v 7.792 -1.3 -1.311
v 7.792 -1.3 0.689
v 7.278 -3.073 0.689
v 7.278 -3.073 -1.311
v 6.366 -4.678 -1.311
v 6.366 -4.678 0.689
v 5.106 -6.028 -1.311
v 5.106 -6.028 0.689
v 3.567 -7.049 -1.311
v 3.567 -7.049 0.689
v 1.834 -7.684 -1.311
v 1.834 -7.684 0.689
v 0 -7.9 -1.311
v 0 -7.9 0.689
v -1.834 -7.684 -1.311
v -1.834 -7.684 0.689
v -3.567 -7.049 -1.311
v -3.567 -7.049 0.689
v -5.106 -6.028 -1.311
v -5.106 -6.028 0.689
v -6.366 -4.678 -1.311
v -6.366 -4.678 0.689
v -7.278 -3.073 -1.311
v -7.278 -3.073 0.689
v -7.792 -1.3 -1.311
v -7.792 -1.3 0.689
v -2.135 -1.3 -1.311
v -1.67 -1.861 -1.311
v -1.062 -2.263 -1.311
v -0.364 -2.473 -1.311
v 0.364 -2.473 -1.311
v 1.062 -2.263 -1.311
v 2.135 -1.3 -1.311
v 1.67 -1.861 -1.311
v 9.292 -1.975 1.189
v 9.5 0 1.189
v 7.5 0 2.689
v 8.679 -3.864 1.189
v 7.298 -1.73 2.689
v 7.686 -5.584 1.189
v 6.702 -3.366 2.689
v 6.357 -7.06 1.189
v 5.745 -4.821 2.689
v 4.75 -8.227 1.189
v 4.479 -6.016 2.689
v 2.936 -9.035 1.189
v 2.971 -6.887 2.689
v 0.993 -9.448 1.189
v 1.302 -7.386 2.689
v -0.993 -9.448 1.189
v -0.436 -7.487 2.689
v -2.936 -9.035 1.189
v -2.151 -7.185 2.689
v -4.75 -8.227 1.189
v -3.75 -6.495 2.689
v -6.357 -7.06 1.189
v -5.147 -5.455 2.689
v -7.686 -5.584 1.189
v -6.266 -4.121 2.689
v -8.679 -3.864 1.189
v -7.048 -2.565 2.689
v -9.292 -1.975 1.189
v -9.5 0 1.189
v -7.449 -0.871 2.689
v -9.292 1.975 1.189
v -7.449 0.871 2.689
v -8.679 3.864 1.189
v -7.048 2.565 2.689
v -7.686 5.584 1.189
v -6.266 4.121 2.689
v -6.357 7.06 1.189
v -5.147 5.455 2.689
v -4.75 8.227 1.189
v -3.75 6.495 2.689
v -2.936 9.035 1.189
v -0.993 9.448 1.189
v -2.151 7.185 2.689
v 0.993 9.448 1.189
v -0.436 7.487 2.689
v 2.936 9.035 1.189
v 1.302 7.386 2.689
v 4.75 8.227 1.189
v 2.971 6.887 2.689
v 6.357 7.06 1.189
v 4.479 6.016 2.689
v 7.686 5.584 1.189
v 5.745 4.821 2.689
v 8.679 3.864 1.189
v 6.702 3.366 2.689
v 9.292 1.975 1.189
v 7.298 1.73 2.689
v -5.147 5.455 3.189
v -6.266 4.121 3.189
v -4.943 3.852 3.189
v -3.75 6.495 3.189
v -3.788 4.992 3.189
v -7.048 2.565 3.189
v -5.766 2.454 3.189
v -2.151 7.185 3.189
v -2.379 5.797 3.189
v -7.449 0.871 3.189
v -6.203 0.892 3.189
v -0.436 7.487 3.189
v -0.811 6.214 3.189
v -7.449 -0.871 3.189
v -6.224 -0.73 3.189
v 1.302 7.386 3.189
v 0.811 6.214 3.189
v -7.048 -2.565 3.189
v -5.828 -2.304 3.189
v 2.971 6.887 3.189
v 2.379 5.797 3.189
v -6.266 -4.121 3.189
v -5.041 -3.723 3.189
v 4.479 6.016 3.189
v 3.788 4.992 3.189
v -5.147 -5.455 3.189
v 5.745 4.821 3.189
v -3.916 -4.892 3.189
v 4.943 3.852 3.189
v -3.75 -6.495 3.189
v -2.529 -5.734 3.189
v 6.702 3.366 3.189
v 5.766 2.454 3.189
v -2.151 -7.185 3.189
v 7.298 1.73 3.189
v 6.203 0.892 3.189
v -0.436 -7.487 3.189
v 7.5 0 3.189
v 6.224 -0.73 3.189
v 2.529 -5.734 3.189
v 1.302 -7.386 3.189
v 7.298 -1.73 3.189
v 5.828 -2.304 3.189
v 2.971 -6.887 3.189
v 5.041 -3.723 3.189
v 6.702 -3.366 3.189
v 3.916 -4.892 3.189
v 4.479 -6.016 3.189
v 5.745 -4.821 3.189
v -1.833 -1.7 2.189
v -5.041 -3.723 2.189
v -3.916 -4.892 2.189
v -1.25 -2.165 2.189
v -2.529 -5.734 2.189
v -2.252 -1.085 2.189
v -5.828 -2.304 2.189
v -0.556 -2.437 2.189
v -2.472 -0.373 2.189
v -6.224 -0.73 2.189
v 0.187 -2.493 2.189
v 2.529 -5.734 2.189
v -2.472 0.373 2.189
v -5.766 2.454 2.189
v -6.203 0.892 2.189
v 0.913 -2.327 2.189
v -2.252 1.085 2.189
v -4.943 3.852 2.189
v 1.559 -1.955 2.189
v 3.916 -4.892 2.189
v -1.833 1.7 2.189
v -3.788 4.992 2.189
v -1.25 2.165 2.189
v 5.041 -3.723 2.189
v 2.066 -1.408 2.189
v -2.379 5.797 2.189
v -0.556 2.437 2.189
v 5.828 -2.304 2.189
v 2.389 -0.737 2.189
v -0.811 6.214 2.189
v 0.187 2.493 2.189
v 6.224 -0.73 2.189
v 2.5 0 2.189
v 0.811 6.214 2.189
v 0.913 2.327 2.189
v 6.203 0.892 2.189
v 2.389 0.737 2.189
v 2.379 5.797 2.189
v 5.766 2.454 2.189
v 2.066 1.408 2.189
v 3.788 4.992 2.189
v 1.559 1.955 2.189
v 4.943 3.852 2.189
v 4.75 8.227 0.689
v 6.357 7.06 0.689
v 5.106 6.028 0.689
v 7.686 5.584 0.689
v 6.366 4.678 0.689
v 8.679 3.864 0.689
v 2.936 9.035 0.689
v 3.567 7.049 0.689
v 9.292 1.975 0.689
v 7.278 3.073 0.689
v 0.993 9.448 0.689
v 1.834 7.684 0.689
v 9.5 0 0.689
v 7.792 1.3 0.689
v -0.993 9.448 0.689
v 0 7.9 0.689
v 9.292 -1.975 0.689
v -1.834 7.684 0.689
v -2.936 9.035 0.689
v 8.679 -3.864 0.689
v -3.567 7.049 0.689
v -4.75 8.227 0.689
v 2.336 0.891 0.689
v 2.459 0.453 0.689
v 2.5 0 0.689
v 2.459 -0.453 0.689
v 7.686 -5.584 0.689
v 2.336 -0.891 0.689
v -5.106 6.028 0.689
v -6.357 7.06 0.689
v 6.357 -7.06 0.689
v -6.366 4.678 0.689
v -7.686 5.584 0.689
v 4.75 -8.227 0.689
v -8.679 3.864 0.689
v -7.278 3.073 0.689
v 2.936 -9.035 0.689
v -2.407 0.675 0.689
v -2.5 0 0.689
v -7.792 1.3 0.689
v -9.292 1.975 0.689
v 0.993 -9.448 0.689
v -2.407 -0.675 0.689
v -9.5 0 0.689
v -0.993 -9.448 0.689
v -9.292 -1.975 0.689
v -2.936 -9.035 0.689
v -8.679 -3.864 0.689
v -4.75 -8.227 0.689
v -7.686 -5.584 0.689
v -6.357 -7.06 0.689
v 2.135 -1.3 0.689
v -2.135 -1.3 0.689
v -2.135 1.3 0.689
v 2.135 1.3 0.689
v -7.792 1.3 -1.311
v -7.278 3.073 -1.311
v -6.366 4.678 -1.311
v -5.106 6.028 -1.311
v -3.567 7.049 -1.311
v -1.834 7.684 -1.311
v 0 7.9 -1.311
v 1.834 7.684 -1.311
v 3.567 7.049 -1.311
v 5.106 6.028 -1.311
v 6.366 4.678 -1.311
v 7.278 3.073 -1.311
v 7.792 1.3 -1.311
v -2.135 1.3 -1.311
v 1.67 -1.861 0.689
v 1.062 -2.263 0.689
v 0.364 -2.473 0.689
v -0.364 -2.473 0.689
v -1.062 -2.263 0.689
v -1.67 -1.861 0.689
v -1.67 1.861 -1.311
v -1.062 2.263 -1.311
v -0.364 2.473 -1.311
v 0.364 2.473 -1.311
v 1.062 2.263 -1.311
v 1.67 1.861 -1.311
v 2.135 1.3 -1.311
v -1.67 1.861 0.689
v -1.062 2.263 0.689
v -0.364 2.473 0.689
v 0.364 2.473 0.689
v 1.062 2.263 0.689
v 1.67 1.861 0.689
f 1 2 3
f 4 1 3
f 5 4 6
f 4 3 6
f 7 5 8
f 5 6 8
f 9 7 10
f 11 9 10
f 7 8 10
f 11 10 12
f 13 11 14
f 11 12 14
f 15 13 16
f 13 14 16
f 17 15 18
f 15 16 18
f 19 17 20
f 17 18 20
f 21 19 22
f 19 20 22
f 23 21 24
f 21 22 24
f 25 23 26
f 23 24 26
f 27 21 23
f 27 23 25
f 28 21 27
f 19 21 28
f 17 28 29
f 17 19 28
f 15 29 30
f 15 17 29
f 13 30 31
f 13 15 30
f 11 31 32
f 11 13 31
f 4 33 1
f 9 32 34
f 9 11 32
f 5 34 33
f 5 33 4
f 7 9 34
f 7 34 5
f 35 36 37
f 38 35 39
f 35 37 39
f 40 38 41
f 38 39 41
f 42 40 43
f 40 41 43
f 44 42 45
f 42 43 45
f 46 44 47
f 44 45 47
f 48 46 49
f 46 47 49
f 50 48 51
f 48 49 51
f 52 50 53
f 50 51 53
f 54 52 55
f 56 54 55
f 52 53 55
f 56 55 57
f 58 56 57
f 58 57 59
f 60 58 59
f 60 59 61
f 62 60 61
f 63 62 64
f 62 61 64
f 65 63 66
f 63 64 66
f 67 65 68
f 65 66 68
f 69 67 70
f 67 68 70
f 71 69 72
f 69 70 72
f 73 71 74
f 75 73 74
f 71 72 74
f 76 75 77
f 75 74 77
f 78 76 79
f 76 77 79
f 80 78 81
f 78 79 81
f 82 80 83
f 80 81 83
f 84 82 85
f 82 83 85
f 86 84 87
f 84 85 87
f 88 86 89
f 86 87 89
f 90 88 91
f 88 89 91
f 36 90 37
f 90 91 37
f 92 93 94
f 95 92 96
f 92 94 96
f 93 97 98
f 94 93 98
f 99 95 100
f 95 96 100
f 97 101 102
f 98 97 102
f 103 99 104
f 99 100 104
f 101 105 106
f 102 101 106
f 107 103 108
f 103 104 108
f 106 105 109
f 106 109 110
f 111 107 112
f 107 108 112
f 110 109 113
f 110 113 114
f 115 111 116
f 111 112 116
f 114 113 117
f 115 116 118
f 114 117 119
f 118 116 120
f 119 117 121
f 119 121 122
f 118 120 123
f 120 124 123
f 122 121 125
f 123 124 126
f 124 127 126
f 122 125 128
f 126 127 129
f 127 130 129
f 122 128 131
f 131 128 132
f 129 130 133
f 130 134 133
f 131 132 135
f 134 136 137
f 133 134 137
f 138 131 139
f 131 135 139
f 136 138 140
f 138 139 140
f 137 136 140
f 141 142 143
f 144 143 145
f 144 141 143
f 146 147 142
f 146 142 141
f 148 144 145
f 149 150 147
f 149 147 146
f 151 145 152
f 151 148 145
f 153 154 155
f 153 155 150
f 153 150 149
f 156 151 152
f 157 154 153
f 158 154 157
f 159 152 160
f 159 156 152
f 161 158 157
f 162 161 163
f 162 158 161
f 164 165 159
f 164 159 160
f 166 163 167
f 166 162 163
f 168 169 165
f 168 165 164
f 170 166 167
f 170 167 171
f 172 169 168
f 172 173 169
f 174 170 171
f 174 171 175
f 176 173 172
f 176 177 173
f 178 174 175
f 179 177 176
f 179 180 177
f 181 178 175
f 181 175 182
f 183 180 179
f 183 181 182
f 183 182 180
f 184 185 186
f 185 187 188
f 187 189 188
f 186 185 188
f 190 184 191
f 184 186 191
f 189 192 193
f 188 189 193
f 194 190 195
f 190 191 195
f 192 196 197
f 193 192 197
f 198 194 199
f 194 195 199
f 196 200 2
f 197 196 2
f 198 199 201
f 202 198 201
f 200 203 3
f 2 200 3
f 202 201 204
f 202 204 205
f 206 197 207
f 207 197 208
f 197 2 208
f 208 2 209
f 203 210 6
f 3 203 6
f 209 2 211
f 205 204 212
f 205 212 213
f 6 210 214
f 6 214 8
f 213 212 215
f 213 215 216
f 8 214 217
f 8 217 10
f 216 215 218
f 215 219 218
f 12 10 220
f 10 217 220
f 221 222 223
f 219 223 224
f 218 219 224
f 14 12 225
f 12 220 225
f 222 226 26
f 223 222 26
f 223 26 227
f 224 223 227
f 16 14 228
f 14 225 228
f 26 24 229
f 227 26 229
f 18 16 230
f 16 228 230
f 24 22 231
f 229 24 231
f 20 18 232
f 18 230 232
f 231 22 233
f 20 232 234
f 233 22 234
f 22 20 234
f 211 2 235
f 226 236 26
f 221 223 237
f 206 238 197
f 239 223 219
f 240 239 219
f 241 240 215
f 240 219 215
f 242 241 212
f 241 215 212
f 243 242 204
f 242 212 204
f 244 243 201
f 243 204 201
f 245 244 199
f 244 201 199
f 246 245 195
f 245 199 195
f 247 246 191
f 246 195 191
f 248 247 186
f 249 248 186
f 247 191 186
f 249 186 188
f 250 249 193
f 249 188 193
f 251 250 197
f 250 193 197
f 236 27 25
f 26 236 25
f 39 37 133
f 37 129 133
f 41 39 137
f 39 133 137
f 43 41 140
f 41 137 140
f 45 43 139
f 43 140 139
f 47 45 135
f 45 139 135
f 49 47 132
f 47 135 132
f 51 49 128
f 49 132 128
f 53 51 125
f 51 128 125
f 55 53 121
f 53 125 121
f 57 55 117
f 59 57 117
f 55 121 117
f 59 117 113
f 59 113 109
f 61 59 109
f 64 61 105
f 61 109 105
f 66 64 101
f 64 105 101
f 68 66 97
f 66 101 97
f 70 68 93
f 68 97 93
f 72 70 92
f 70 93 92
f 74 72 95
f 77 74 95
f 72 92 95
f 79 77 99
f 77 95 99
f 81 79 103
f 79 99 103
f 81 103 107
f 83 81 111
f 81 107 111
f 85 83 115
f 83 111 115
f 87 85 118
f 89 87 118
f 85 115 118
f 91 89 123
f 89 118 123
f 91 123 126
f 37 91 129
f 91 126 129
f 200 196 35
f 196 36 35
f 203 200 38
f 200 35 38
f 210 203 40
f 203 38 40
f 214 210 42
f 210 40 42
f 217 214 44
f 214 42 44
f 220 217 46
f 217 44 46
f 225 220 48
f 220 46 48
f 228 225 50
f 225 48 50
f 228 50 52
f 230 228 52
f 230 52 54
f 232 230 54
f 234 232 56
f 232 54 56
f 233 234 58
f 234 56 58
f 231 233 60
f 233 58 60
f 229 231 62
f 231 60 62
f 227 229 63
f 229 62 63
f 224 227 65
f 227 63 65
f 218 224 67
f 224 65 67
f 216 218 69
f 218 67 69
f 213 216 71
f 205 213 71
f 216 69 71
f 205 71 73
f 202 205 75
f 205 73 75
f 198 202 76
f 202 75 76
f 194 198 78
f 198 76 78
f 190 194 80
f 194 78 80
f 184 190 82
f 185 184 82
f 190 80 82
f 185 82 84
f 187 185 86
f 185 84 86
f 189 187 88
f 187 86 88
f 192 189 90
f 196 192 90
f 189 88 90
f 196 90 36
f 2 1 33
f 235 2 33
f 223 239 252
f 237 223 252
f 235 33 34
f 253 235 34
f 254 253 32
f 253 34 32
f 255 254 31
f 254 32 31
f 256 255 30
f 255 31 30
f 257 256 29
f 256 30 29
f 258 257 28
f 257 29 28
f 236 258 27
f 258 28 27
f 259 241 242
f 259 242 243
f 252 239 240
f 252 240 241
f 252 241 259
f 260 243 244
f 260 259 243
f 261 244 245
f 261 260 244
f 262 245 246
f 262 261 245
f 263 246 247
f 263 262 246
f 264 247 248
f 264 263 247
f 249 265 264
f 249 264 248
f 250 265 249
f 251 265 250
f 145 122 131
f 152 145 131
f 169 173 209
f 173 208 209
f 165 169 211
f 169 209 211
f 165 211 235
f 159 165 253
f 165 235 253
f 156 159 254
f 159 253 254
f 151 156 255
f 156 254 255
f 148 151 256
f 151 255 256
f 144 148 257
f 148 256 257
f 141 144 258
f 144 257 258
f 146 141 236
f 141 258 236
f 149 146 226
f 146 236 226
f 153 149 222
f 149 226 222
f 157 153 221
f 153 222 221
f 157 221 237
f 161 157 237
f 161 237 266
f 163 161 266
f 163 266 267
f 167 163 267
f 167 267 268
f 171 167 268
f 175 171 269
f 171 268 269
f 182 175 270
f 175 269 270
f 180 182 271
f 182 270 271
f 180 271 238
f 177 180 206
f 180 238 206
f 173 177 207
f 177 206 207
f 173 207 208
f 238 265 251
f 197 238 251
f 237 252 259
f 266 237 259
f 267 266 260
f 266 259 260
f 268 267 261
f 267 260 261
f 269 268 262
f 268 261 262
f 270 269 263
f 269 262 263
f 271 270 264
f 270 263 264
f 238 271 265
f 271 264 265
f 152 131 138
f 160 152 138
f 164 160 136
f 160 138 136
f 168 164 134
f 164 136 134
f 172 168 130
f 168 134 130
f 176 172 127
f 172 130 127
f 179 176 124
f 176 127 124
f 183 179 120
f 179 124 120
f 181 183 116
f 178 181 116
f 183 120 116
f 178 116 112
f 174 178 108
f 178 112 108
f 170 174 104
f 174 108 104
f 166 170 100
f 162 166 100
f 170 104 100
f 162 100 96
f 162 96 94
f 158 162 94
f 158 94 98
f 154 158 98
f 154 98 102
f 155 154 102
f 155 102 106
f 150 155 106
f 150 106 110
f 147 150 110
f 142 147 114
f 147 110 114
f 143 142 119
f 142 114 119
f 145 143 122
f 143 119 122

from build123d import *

# Parameters (mm, degrees)
F2_R     = 7.9
F3_DEPTH = 2
F5_DEPTH = 2
F7_DEPTH = 1


with BuildPart() as f1:
    # F0 (on Front) → F1 (revolve)
    with BuildSketch(Plane.XZ):
        Polygon((2.5, 3.1889840401), (2.5, 0.6889840401), (9.5, 0.6889840401), (9.5, 1.1889840401), (7.5, 2.6889840401), (7.5, 3.1889840401), align=None)
    revolve(axis=Axis((0, 0, 1.9389840401), (0, 0, -1)))

    # F2 (on face) → F3 (join)
    with BuildSketch(Plane(origin=(0, 0, 0.6889840401), x_dir=(1, 0, 0), z_dir=(0, 0, -1))):
        Circle(F2_R)
    extrude(amount=F3_DEPTH)

    # F4 (on face) → F5 (cut)
    with BuildSketch(Plane(origin=(0, 0, -1.3110159599), x_dir=(1, 0, 0), z_dir=(0, 0, -1))):
        with BuildLine():
            ThreePointArc((2.1354156504, -1.3), (2.4071289045, -0.675078097), (2.5, 0))
            ThreePointArc((2.5, 0), (2.4071289045, 0.675078097), (2.1354156504, 1.3))
            Line((2.1354156504, 1.3), (-2.1354156504, 1.3))
            ThreePointArc((-2.1354156504, 1.3), (-2.5, 0), (-2.1354156504, -1.3))
            Line((-2.1354156504, -1.3), (2.1354156504, -1.3))
        make_face()
        with BuildLine():
            ThreePointArc((2.1354156504, 1.3), (2.4071289045, 0.675078097), (2.5, 0))
            ThreePointArc((2.5, 0), (2.4071289045, -0.675078097), (2.1354156504, -1.3))
            Line((2.1354156504, -1.3), (8.2728397101, -1.3))
            Line((8.2728397101, -1.3), (8.2728397101, 1.3))
            Line((8.2728397101, 1.3), (2.1354156504, 1.3))
        make_face()
        with BuildLine():
            Line((-2.1354156504, 1.3), (2.1354156504, 1.3))
            ThreePointArc((2.1354156504, 1.3), (0, 2.5), (-2.1354156504, 1.3))
        make_face()
        with BuildLine():
            ThreePointArc((-2.1354156504, -1.3), (0, -2.5), (2.1354156504, -1.3))
            Line((2.1354156504, -1.3), (-2.1354156504, -1.3))
        make_face()
        with BuildLine():
            ThreePointArc((-2.1354156504, -1.3), (-2.5, 0), (-2.1354156504, 1.3))
            Line((-2.1354156504, 1.3), (-8.2728397101, 1.3))
            Line((-8.2728397101, 1.3), (-8.2728397101, -1.3))
            Line((-8.2728397101, -1.3), (-2.1354156504, -1.3))
        make_face()
    extrude(amount=-F5_DEPTH, mode=Mode.SUBTRACT)

    # F6 (on face) → F7 (cut)
    with BuildSketch(Plane.XY.offset(3.1889840401)):
        with BuildLine():
            Line((0, -5.7335105867), (2.5289812019, -5.7335105867))
            ThreePointArc((2.5289812019, -5.7335105867), (0, 6.2664894133), (-2.5289812019, -5.7335105867))
            Line((-2.5289812019, -5.7335105867), (0, -5.7335105867))
        make_face()
    extrude(amount=-F7_DEPTH, mode=Mode.SUBTRACT)


solid = f1.part
